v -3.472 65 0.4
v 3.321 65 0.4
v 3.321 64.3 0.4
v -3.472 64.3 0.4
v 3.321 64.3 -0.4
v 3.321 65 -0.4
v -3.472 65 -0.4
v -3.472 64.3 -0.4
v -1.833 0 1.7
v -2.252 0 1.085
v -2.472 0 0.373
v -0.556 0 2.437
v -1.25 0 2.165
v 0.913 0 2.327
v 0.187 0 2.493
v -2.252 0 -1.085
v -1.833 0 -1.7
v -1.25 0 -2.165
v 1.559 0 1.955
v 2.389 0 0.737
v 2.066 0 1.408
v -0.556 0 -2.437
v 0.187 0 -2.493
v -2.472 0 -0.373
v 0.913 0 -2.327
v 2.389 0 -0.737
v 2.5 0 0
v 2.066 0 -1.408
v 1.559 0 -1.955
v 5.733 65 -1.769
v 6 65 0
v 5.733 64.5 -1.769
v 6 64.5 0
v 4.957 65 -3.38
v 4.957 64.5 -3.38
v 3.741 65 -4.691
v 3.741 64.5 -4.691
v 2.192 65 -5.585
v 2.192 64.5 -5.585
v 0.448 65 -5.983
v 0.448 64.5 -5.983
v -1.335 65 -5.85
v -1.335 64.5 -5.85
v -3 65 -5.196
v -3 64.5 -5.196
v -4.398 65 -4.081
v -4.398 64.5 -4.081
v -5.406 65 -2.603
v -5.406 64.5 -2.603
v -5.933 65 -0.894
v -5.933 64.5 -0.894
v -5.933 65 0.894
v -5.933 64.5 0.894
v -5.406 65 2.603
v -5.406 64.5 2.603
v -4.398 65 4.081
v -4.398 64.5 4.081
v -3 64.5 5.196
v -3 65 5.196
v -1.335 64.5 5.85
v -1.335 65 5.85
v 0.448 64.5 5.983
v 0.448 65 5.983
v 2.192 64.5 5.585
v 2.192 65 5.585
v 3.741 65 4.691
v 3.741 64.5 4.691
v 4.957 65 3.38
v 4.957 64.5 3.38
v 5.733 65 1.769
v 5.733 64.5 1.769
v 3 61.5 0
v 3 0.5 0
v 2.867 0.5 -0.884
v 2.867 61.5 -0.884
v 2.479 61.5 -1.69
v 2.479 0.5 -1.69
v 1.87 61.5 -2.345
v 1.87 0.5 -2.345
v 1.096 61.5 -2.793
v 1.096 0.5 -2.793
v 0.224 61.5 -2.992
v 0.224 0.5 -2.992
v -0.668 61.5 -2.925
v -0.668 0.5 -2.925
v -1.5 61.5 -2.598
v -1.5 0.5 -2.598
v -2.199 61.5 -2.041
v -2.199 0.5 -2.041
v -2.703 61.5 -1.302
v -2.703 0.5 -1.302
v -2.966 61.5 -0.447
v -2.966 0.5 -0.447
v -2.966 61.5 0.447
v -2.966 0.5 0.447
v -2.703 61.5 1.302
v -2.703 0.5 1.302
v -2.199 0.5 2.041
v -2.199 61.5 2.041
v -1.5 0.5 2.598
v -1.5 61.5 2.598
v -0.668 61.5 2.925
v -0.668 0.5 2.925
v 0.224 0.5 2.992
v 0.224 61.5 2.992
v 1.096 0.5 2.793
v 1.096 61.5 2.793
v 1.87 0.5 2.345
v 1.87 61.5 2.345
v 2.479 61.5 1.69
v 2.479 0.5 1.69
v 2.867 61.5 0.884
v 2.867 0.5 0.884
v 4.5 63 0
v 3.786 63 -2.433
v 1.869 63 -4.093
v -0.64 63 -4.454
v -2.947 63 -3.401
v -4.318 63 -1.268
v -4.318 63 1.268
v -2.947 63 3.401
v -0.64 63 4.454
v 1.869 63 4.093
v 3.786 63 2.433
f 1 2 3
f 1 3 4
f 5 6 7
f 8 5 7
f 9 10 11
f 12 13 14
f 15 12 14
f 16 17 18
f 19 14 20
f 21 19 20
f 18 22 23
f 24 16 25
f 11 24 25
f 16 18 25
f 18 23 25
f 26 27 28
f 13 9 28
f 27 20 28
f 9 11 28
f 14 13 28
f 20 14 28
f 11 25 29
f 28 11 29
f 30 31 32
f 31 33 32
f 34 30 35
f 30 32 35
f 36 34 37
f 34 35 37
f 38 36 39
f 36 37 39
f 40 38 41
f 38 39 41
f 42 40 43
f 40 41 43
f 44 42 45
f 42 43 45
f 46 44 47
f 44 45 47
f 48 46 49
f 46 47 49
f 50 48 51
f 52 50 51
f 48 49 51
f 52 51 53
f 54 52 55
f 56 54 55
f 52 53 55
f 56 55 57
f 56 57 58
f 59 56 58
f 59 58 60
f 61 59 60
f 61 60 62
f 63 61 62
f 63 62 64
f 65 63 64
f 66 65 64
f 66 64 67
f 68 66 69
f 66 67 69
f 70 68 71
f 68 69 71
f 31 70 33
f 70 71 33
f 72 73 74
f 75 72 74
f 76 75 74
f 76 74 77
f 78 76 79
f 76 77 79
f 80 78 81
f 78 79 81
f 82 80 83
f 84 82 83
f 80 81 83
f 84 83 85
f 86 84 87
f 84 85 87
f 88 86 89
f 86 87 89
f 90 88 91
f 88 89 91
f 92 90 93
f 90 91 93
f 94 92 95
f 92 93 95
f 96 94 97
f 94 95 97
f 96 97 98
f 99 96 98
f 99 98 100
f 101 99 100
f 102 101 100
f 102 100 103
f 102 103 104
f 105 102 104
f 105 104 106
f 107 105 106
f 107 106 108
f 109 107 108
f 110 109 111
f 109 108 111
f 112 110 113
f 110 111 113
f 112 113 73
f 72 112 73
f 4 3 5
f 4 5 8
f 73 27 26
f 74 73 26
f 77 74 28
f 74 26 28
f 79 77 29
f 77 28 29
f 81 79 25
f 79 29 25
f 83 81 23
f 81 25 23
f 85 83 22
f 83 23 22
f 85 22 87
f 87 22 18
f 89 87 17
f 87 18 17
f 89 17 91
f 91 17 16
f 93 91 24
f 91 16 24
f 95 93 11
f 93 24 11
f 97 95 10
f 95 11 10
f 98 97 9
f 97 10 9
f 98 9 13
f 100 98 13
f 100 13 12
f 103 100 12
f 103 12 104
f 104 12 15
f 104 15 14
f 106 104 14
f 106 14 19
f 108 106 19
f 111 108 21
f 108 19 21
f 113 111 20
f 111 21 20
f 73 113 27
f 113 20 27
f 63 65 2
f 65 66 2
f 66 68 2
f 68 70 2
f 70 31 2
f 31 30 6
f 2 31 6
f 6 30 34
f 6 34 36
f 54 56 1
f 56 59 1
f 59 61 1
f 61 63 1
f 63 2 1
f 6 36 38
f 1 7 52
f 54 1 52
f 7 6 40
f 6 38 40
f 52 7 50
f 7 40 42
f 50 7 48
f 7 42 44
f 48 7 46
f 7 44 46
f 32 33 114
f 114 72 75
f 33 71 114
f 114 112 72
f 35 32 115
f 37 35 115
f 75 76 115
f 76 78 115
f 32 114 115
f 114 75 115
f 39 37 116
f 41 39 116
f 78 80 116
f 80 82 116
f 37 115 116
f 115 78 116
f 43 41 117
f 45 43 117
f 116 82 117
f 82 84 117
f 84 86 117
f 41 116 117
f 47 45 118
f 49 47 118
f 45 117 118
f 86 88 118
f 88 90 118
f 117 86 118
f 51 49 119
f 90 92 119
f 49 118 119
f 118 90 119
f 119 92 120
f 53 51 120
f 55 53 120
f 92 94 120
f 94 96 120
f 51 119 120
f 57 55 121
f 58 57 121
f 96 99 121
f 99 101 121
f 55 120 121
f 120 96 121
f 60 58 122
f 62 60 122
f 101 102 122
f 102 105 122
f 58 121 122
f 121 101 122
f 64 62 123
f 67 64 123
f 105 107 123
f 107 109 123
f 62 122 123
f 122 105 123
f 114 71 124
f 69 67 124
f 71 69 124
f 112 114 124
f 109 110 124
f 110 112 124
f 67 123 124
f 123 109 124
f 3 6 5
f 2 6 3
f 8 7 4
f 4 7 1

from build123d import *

# Parameters (mm, degrees)
SKETCH_2_W          = 6.792543124
SKETCH_2_H          = 0.8
CUT_EXTRUDE_1_DEPTH = 0.7
CHAMFER_1_SIZE      = 0.5


with BuildPart() as part:
    # 草圖1 → 旋轉1 (revolve)
    with BuildSketch(Plane.XY):
        Polygon((0, 65), (6, 65), (6, 64.5), (3, 61.5), (3, 0), (0, 0), align=None)
    revolve(axis=Axis((0, -8.5328125, 0), (0, 1, 0)))

    # 草圖2 → 除料-伸長1 (cut)
    with BuildSketch(Plane(origin=(0, 65, 0), x_dir=(-1, 0, 0), z_dir=(0, 1, 0))):
        with Locations((0.075670859, 0)):
            Rectangle(SKETCH_2_W, SKETCH_2_H)
    extrude(amount=-CUT_EXTRUDE_1_DEPTH, mode=Mode.SUBTRACT)

    # 導角1
    chamfer_1_edges = [part.edges().sort_by_distance(p)[0] for p in [
        (-3, 0, 0),
    ]]
    chamfer(chamfer_1_edges, length=CHAMFER_1_SIZE)


solid = part.part
